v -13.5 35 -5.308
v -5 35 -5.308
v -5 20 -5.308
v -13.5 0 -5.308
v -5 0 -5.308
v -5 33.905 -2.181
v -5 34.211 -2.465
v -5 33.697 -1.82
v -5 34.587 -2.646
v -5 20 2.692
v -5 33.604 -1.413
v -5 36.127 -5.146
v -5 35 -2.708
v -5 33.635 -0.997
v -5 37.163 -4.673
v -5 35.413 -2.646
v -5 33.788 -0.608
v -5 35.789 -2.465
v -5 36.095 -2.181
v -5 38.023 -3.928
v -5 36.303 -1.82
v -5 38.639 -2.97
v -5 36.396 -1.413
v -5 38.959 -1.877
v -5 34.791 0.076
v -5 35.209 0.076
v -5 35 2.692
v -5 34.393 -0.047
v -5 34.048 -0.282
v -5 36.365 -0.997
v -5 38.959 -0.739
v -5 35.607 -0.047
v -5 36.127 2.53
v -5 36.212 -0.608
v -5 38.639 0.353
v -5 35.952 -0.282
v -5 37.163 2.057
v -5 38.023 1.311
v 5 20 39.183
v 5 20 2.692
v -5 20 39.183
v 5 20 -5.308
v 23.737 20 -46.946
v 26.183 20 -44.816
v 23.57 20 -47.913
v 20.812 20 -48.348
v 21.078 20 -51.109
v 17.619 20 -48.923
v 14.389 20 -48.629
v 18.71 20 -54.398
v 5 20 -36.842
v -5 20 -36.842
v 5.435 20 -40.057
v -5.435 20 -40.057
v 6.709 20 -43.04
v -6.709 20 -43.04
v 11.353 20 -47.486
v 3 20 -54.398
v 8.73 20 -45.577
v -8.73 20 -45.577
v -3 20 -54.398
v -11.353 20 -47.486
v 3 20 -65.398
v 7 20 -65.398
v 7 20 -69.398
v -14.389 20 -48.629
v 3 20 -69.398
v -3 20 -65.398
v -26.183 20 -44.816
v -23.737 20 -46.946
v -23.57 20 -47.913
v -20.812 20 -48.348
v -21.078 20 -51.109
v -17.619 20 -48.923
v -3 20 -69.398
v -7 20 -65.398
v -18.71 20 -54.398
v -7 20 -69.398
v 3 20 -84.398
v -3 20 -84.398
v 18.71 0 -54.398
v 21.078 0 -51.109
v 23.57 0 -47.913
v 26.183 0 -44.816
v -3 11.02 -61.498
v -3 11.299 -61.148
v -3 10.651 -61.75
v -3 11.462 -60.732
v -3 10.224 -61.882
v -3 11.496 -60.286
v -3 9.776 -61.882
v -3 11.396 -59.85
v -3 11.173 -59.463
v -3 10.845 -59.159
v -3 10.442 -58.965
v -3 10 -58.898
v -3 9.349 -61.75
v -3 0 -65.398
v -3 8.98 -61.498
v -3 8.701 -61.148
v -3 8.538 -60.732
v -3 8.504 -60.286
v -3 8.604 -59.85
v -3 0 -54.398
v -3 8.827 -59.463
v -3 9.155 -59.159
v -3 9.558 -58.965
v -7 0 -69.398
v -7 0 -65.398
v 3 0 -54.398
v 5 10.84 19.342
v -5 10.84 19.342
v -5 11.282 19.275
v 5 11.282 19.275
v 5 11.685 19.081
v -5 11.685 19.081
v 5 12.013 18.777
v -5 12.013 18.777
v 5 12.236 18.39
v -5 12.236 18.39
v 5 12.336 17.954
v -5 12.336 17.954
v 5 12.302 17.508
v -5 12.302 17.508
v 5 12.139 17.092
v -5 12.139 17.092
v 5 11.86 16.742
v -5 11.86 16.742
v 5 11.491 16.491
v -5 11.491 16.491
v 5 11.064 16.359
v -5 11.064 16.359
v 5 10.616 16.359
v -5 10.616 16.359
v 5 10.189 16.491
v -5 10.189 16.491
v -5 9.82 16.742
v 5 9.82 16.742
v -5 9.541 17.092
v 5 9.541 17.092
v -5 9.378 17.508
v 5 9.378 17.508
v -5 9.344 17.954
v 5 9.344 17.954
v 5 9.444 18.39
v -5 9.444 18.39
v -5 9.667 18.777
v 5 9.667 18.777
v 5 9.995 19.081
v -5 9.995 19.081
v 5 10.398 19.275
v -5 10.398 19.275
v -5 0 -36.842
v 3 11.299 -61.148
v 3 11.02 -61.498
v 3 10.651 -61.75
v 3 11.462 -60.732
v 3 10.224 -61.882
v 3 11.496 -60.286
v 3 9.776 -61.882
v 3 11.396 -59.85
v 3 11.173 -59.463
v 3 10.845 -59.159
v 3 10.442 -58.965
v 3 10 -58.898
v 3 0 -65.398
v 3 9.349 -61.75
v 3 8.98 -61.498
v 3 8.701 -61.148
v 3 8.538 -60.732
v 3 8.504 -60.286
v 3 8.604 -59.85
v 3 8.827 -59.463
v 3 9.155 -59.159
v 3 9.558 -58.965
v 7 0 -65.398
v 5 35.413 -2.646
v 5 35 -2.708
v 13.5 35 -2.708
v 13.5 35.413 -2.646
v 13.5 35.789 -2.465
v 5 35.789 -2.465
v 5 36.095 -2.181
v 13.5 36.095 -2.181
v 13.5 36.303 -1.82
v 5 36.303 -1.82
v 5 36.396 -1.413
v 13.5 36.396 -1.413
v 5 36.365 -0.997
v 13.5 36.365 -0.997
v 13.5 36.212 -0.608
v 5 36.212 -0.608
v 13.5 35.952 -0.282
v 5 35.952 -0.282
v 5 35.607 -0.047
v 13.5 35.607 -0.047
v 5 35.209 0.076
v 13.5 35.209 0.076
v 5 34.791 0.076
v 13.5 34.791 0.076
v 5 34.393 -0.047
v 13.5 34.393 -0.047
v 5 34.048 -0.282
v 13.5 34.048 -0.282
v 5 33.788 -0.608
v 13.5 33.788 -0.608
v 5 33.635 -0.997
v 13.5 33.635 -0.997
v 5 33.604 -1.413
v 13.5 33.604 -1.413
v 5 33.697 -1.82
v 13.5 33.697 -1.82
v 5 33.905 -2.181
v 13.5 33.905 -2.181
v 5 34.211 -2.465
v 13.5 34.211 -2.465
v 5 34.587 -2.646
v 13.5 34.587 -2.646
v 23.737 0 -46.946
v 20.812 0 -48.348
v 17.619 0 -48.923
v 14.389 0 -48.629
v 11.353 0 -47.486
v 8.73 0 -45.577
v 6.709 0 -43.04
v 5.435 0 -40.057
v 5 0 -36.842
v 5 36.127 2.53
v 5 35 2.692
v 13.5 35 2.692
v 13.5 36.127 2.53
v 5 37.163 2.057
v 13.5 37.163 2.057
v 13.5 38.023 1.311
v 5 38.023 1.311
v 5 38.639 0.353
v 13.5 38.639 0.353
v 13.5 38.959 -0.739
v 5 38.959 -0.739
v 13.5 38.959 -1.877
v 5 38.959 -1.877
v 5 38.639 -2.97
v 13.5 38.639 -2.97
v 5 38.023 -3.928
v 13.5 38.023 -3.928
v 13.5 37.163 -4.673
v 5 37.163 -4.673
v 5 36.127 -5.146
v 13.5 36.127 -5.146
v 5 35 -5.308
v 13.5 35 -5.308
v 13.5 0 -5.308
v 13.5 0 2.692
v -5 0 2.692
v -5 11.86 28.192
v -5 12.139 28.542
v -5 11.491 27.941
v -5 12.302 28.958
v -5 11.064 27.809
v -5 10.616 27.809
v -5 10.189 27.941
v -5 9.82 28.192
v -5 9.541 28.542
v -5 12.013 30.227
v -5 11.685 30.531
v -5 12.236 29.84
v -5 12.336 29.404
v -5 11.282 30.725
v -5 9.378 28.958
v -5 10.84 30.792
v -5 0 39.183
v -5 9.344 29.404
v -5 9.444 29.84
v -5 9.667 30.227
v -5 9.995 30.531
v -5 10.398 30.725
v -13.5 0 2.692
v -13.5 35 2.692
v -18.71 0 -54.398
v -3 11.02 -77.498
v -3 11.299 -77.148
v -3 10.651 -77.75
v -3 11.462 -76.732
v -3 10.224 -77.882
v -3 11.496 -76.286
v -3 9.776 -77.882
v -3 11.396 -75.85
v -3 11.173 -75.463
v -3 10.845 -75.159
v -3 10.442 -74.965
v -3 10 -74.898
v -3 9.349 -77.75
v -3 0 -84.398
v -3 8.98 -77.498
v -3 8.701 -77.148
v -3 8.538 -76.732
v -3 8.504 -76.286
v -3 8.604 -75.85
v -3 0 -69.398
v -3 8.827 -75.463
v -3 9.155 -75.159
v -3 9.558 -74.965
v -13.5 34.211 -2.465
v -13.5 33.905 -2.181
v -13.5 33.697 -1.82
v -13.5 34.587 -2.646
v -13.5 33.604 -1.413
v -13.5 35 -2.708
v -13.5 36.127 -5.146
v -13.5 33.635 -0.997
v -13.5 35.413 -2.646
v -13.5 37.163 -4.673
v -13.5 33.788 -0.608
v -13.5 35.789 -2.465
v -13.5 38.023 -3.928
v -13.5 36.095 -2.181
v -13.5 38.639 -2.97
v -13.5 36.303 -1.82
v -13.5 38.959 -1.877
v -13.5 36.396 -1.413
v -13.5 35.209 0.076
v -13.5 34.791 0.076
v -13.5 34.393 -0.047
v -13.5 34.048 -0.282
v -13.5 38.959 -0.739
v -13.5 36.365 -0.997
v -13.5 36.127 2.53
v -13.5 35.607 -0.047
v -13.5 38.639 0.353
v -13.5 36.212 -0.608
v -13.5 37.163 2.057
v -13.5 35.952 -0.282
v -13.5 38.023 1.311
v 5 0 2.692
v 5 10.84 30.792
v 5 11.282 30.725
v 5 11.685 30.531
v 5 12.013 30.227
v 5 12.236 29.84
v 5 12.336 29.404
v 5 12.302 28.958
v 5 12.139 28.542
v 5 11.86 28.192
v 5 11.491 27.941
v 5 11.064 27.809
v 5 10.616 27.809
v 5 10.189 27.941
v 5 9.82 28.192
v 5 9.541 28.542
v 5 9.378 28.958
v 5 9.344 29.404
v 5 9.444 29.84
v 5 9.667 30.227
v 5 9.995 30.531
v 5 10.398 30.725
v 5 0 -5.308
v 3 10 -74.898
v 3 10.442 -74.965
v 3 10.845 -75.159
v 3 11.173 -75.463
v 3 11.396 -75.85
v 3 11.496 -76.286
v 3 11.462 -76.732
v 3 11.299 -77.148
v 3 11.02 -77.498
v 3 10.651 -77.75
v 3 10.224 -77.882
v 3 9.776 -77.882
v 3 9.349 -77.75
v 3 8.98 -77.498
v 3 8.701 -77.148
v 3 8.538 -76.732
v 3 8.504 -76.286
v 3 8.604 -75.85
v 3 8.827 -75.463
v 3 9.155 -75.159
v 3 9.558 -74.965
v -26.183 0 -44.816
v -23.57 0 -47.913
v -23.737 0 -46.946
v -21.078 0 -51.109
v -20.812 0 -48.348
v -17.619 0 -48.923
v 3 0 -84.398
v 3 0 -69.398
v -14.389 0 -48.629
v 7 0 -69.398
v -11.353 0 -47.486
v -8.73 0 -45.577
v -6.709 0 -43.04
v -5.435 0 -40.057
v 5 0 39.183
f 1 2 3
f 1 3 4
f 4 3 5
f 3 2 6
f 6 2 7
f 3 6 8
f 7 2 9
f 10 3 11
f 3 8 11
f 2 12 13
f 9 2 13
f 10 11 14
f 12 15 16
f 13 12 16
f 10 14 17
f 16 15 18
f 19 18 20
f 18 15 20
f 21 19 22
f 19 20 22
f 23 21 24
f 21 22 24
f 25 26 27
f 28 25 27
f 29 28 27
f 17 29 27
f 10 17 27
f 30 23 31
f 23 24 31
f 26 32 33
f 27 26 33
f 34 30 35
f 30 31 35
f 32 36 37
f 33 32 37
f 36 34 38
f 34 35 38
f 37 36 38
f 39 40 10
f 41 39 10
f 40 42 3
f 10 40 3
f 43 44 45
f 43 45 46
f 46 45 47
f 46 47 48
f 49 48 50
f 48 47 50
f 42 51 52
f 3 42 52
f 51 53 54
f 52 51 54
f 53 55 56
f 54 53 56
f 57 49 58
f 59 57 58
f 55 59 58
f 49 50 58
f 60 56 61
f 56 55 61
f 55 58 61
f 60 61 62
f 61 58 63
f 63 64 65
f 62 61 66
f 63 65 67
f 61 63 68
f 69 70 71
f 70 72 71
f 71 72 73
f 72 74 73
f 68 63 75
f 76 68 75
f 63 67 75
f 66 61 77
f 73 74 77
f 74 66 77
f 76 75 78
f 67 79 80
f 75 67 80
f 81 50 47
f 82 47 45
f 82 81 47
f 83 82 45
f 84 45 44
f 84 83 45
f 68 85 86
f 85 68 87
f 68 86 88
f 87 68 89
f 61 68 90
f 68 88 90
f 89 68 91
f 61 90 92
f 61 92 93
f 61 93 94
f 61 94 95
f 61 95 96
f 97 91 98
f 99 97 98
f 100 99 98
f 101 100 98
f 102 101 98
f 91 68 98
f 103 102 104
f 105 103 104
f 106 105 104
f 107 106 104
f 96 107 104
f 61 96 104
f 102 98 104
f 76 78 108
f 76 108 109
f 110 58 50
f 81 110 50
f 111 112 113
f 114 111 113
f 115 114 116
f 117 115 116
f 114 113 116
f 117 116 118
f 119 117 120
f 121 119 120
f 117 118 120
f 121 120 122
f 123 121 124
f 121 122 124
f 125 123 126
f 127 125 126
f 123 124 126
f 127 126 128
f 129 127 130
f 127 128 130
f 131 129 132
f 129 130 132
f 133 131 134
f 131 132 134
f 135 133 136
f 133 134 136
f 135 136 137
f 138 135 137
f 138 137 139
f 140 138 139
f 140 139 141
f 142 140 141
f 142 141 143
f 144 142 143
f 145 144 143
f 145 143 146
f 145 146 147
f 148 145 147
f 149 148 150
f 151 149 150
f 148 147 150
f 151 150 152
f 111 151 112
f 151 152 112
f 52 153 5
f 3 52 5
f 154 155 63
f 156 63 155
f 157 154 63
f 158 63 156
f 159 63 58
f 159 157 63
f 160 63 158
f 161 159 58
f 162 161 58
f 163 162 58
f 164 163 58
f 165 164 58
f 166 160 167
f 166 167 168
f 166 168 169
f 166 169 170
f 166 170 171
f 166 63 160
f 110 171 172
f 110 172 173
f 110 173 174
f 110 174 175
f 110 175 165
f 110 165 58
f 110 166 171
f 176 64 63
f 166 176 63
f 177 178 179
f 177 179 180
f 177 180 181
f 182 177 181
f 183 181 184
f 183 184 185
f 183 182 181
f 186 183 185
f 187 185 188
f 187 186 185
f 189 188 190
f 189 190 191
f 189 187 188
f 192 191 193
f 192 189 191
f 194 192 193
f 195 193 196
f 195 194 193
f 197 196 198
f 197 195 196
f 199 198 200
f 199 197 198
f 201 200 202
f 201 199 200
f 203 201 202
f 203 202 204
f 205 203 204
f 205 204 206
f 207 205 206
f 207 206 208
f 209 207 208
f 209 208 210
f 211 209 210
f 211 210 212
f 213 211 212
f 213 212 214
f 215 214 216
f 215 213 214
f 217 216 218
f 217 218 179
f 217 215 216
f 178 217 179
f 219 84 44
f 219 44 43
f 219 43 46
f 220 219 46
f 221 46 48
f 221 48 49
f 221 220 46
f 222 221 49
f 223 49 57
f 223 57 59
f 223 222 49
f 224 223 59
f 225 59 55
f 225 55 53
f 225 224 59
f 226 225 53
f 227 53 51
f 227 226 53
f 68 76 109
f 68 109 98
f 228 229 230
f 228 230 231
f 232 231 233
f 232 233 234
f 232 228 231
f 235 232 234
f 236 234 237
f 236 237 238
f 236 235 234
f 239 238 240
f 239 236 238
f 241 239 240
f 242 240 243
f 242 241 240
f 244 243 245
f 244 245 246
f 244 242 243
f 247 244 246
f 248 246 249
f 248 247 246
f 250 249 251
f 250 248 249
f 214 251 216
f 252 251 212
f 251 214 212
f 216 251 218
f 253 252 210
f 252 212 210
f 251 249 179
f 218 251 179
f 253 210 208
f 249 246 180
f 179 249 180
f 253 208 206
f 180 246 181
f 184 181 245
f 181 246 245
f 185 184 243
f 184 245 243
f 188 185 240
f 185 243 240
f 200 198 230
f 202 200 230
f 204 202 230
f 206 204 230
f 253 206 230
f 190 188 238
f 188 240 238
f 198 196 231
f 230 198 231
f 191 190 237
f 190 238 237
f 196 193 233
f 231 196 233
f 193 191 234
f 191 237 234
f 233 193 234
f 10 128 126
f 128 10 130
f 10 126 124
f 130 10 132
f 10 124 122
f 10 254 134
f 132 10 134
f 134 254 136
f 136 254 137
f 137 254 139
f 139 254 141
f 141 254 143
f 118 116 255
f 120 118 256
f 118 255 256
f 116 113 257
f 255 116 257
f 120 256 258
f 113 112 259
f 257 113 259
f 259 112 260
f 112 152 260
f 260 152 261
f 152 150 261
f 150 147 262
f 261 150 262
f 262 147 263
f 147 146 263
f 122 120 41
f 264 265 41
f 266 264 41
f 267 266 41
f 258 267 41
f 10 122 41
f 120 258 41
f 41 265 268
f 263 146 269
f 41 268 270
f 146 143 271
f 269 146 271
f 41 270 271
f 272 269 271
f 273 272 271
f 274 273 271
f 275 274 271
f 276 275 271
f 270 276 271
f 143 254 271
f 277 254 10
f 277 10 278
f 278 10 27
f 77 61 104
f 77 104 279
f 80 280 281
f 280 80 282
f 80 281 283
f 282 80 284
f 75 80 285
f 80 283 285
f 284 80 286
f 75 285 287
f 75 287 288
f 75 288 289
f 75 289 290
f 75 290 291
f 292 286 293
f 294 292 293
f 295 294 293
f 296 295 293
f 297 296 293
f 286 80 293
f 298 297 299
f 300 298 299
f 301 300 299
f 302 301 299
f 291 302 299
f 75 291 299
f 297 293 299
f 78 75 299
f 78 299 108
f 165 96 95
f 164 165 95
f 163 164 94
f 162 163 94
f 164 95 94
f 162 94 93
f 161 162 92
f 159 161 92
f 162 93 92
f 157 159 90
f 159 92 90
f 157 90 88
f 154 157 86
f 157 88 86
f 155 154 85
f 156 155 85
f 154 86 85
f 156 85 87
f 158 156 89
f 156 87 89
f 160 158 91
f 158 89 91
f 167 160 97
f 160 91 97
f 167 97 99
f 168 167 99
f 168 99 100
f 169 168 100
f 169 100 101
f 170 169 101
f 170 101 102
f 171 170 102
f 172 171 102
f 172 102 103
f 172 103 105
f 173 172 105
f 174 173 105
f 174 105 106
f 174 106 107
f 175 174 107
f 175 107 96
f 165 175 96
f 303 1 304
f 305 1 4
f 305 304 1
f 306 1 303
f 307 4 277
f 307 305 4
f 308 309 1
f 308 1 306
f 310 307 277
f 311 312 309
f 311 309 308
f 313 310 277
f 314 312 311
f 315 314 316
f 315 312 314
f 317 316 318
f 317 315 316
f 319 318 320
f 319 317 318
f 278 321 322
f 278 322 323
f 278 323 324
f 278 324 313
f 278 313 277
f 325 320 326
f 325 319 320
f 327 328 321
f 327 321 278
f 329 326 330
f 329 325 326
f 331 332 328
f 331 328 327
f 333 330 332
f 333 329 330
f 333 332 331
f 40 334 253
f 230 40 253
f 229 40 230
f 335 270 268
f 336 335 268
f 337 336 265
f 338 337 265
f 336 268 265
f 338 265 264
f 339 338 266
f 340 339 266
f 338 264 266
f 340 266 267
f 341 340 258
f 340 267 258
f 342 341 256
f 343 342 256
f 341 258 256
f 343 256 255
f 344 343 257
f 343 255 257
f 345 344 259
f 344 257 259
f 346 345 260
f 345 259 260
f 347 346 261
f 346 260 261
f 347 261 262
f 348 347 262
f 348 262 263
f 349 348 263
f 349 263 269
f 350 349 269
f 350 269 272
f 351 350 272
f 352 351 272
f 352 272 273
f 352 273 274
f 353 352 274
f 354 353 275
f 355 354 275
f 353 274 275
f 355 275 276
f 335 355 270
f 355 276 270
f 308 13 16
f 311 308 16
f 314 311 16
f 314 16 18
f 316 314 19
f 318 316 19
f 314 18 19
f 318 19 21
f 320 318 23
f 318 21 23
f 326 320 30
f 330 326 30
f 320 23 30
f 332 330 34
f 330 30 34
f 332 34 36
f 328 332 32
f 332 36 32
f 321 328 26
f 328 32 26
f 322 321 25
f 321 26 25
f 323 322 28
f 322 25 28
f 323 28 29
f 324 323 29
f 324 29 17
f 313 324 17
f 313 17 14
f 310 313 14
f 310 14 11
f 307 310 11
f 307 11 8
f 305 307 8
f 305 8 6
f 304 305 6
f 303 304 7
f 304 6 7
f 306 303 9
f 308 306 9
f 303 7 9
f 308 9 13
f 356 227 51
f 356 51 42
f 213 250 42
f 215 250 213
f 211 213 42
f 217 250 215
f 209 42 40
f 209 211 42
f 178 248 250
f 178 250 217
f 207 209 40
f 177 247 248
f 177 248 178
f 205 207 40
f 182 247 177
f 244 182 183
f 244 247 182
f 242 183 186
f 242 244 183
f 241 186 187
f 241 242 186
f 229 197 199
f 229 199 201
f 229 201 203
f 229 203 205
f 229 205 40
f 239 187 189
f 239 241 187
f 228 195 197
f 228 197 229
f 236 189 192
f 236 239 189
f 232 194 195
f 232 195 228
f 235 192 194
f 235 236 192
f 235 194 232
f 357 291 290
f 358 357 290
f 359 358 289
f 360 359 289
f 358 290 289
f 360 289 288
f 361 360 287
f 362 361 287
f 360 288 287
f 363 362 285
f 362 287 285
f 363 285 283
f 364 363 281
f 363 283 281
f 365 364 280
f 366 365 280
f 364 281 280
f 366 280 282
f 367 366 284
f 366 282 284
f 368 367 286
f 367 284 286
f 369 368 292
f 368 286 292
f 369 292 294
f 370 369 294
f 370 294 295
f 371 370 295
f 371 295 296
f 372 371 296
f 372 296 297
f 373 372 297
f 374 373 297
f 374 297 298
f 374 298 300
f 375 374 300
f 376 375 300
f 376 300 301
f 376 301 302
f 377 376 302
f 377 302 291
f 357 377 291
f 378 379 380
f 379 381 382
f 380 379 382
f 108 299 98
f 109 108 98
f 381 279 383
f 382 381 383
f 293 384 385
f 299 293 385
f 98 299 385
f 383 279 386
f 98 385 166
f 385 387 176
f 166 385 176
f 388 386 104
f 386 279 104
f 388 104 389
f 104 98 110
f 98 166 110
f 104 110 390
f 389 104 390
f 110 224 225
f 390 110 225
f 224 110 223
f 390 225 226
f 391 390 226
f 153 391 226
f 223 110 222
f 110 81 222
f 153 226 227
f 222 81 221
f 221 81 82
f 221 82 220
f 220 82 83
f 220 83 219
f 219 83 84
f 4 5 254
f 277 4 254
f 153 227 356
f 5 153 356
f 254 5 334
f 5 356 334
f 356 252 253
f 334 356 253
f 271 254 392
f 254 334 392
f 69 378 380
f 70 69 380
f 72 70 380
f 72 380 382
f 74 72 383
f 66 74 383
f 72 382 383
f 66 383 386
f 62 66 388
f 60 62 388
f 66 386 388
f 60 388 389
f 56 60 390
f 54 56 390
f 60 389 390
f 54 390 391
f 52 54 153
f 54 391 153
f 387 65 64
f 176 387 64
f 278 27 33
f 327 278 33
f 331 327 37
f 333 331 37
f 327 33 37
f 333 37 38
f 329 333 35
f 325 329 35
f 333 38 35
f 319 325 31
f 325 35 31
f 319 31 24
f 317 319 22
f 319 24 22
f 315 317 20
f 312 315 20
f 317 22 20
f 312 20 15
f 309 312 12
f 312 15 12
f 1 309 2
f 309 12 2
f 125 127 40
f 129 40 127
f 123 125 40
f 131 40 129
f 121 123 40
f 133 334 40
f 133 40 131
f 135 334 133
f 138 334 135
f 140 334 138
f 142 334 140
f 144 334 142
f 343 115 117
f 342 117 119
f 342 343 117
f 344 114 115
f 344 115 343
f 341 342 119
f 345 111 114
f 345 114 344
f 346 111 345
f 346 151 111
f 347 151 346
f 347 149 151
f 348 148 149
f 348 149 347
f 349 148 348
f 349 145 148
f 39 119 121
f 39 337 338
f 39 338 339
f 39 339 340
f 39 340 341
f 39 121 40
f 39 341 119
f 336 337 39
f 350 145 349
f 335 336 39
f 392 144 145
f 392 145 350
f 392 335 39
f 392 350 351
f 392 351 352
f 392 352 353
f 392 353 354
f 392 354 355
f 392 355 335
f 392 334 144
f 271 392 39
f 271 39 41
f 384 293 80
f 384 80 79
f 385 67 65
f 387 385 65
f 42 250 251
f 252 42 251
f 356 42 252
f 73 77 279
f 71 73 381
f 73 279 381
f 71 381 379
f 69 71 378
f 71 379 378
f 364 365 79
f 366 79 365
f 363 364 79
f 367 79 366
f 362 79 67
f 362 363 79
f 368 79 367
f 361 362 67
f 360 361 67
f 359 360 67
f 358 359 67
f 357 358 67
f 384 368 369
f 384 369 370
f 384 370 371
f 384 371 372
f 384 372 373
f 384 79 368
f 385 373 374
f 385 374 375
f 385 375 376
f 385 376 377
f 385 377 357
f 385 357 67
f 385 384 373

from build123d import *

# Parameters (mm, degrees)
BOSS_EXTRU_1_DEPTH      = 20
ESQUISSE3_R             = 1.5
ENL_V_MAT_EXTRU_3_DEPTH = 20
ESQUISSE4_R             = 1.5
ENL_V_MAT_EXTRU_4_DEPTH = 10
ESQUISSE5_R             = 1.5
ENL_V_MAT_EXTRU_5_DEPTH = 10
ESQUISSE6_R             = 1.4
BOSS_EXTRU_2_DEPTH      = 8.5


with BuildPart() as part:
    # Esquisse1 → Boss.-Extru.1 (new body)
    with BuildSketch(Plane(origin=(0, 0, 0), x_dir=(1, 0, 0), z_dir=(0, 1, 0))):
        with BuildLine():
            Line((-3, 84.398281038), (-3, 69.398281038))
            Line((-3, 69.398281038), (-7, 69.398281038))
            Line((-7, 69.398281038), (-7, 65.398281038))
            Line((-7, 65.398281038), (-3, 65.398281038))
            Line((-3, 65.398281038), (-3, 54.398281038))
            Line((-3, 54.398281038), (-18.71, 54.398281038))
            ThreePointArc((-18.71, 54.398281038), (-22.308577777, 49.499317693), (-26.183329952, 44.81574006))
            ThreePointArc((-26.183329952, 44.81574006), (-12.83252844, 48.159570073), (-5, 36.842476876))
            Line((-5, 36.842476876), (-5, -39.182739587))
            Line((-5, -39.182739587), (0, -39.182739587))
            Line((0, -39.182739587), (0, 84.398281038))
            Line((0, 84.398281038), (-3, 84.398281038))
        make_face()
    boss_extru_1 = extrude(amount=BOSS_EXTRU_1_DEPTH)

    # Symétrie1: Boss.-Extru.1 across plane
    add(boss_extru_1.mirror(Plane(origin=(0, 20, -84.398281038), x_dir=(0, 0, 1), z_dir=(-1, 0, 0))))

    # Esquisse3 → Enlèv. mat.-Extru.3 (cut)
    with BuildSketch(Plane.ZY.offset(3)):
        with Locations((-76.398281038, 10)):
            Circle(ESQUISSE3_R)
        with Locations((-60.398281038, 10)):
            Circle(ESQUISSE3_R)
    extrude(amount=-ENL_V_MAT_EXTRU_3_DEPTH, mode=Mode.SUBTRACT)

    # Esquisse4 → Enlèv. mat.-Extru.4 (cut)
    with BuildSketch(Plane.ZY.offset(5)):
        with Locations((29.291975875, 10.84)):
            Circle(ESQUISSE4_R)
    extrude(amount=-ENL_V_MAT_EXTRU_4_DEPTH, mode=Mode.SUBTRACT)

    # Esquisse5 → Enlèv. mat.-Extru.5 (cut)
    with BuildSketch(Plane.ZY.offset(5)):
        with Locations((17.841975875, 10.84)):
            Circle(ESQUISSE5_R)
    extrude(amount=-ENL_V_MAT_EXTRU_5_DEPTH, mode=Mode.SUBTRACT)

    # Esquisse6 → Boss.-Extru.2 (add)
    with BuildSketch(Plane(origin=(5, 0, 0), x_dir=(0, 0, -1), z_dir=(1, 0, 0))):
        with BuildLine():
            Line((5.308208853, 0), (-2.691791147, 0))
            Line((-2.691791147, 0), (-2.691791147, 35))
            ThreePointArc((-2.691791147, 35), (1.308208853, 39), (5.308208853, 35))
            Line((5.308208853, 35), (5.308208853, 0))
        make_face()
        with Locations((1.308208853, 35)):
            Circle(ESQUISSE6_R, mode=Mode.SUBTRACT)
    boss_extru_2 = extrude(amount=BOSS_EXTRU_2_DEPTH)

    # Symétrie2: Boss.-Extru.2 across plane
    add(boss_extru_2.mirror(Plane.ZY))


solid = part.part
